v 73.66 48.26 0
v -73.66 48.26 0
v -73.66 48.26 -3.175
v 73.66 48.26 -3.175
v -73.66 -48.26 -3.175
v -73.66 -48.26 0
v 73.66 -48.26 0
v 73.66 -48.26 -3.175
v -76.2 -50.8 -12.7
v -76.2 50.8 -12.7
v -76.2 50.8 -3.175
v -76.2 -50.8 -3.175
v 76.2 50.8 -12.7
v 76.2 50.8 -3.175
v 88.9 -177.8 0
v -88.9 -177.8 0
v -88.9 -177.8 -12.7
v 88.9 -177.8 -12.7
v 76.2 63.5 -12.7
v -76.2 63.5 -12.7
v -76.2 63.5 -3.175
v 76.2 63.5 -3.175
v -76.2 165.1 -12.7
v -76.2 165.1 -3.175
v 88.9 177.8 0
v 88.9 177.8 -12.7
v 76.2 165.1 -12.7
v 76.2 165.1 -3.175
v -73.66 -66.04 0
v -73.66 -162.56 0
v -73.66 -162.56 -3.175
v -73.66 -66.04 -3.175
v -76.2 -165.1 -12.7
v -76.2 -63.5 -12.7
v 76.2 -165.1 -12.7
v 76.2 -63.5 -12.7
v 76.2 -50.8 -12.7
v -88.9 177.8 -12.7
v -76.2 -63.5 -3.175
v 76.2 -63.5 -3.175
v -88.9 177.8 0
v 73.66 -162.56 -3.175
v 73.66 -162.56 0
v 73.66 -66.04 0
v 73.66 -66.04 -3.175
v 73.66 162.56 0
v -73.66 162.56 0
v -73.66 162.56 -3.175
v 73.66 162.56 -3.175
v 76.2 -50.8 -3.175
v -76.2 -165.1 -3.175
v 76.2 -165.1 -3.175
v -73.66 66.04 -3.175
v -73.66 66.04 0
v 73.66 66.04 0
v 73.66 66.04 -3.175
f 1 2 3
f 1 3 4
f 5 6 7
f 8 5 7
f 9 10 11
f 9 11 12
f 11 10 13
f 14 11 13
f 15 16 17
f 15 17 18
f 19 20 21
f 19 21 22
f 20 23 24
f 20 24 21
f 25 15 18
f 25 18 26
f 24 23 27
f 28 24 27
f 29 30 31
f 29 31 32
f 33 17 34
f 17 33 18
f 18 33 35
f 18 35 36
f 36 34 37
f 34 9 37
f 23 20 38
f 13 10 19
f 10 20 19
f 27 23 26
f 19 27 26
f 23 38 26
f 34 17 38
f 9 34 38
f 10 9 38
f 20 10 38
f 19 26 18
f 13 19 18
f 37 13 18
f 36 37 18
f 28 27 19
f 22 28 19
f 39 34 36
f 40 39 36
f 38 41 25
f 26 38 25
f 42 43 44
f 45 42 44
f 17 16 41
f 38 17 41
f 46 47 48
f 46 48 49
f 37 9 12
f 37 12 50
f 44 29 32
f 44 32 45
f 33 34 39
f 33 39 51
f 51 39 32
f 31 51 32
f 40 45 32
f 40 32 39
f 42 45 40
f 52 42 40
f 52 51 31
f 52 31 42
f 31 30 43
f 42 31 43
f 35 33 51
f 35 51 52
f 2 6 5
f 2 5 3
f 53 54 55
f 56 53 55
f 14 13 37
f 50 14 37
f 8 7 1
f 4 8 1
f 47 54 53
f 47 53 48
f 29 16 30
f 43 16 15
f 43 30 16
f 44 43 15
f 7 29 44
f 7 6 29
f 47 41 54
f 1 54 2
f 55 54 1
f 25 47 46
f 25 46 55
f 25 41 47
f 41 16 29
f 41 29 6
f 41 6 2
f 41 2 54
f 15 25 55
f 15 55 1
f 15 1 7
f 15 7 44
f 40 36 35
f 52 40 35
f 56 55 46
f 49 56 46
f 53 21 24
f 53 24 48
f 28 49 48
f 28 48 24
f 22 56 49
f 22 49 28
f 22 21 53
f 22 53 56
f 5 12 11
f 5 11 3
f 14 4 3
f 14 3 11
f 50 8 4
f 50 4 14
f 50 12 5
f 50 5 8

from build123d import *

# Parameters (mm, degrees)
F0_W     = 177.8
F0_H     = 355.6
F2_DEPTH = 12.7
F1_W     = 147.32
F1_H     = 96.52
F4_DEPTH = 12.701
F8_W     = 152.4
F8_H     = 101.6
F9_DEPTH = 9.525


# Not quite as in the source:
# - a length typed as a fraction of an inch, garbled in the dataset ("3 / 203.2 mm" for 3/8 in), is restored


with BuildPart() as f2:
    # F0 (on Top) → F2 (new body)
    with BuildSketch(Plane.XY):
        Rectangle(F0_W, F0_H)
    extrude(amount=-F2_DEPTH)

    # F1 (on face) → F4 (cut, through all)
    with BuildSketch(Plane.XY):
        with Locations((0, -114.3)):
            Rectangle(F1_W, F1_H)
        Rectangle(F1_W, F1_H)
        with Locations((0, 114.3)):
            Rectangle(F1_W, F1_H)
    extrude(amount=-F4_DEPTH, mode=Mode.SUBTRACT)

    # F8 (on face) → F9 (cut)
    with BuildSketch(Plane(origin=(0, 0, -12.7), x_dir=(1, 0, 0), z_dir=(0, 0, -1))):
        with Locations((0, -114.3)):
            Rectangle(F8_W, F8_H)
        Rectangle(F8_W, F8_H)
        with Locations((0, 114.3)):
            Rectangle(F8_W, F8_H)
    extrude(amount=-F9_DEPTH, mode=Mode.SUBTRACT)


solid = f2.part
